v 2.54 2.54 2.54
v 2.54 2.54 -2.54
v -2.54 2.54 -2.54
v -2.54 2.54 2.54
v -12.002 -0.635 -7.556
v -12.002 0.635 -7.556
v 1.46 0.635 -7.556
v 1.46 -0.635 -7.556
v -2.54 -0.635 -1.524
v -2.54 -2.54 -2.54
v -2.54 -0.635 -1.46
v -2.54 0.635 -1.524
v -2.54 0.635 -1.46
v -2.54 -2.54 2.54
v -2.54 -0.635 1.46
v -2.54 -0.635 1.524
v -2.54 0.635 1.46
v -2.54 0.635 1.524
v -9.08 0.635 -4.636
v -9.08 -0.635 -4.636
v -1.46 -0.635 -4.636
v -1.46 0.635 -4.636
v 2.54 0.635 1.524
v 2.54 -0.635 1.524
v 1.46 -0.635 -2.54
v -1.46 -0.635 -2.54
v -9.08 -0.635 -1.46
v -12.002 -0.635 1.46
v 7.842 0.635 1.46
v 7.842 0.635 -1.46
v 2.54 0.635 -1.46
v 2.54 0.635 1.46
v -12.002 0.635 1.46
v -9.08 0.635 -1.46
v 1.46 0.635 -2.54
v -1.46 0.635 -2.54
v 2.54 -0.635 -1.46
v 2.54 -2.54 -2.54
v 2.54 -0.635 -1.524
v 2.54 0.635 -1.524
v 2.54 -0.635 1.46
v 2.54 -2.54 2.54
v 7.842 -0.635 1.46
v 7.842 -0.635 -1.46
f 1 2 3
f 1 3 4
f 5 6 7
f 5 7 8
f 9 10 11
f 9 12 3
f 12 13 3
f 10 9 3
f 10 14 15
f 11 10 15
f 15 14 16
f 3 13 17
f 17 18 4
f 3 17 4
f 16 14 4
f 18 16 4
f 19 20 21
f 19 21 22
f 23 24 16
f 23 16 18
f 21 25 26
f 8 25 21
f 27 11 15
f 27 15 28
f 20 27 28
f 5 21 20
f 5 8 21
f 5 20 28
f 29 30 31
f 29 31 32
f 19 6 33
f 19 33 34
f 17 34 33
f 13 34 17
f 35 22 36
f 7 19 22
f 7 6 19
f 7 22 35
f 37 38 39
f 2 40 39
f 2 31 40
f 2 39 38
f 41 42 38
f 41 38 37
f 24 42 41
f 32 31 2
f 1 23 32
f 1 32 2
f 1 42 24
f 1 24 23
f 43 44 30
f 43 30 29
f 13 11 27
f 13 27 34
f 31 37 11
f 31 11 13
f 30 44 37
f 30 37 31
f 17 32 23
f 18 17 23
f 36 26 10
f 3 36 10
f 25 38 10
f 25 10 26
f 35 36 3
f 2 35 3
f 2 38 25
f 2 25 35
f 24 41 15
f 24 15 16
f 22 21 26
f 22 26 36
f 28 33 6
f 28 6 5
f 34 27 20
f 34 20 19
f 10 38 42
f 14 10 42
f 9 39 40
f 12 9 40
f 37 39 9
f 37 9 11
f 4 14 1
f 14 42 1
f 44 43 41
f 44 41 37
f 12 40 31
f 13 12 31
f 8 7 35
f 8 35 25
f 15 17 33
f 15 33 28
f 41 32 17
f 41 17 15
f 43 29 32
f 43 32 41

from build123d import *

# Parameters (mm, degrees)
F0_W     = 5.08
F0_H     = 5.08
F1_DEPTH = 2.54
F4_W     = 1.27
F4_H     = 3.048
F5_DEPTH = 5.08
F3_W     = 2.921
F3_H     = 1.27


with BuildPart() as f1:
    # F0 (on Right) → F1 (new body, symmetric)
    with BuildSketch(Plane.YZ):
        Rectangle(F0_W, F0_H)
    extrude(amount=F1_DEPTH, both=True)

    # F4 (on face) → F5 (cut, through all)
    with BuildSketch(Plane.YZ.offset(2.54)):
        Rectangle(F4_W, F4_H)
    extrude(amount=-F5_DEPTH, mode=Mode.SUBTRACT)

    # F6: sweep along a path in F2
    with BuildLine(Plane.XZ) as f6_path:
        Line((0, -2.54), (0, -6.096))
        Line((0, -6.096), (-10.541, -6.096))
        Line((-10.541, -6.096), (-10.541, 0))
        Line((-10.541, 0), (7.8415209427, 0))
    # F3 (on face) → F6 (sweep)
    with BuildSketch(Plane(origin=(0, 0, -2.54), x_dir=(1, 0, 0), z_dir=(0, 0, -1))):
        Rectangle(F3_W, F3_H)
    sweep(path=f6_path.line, transition=Transition.RIGHT)


solid = f1.part
